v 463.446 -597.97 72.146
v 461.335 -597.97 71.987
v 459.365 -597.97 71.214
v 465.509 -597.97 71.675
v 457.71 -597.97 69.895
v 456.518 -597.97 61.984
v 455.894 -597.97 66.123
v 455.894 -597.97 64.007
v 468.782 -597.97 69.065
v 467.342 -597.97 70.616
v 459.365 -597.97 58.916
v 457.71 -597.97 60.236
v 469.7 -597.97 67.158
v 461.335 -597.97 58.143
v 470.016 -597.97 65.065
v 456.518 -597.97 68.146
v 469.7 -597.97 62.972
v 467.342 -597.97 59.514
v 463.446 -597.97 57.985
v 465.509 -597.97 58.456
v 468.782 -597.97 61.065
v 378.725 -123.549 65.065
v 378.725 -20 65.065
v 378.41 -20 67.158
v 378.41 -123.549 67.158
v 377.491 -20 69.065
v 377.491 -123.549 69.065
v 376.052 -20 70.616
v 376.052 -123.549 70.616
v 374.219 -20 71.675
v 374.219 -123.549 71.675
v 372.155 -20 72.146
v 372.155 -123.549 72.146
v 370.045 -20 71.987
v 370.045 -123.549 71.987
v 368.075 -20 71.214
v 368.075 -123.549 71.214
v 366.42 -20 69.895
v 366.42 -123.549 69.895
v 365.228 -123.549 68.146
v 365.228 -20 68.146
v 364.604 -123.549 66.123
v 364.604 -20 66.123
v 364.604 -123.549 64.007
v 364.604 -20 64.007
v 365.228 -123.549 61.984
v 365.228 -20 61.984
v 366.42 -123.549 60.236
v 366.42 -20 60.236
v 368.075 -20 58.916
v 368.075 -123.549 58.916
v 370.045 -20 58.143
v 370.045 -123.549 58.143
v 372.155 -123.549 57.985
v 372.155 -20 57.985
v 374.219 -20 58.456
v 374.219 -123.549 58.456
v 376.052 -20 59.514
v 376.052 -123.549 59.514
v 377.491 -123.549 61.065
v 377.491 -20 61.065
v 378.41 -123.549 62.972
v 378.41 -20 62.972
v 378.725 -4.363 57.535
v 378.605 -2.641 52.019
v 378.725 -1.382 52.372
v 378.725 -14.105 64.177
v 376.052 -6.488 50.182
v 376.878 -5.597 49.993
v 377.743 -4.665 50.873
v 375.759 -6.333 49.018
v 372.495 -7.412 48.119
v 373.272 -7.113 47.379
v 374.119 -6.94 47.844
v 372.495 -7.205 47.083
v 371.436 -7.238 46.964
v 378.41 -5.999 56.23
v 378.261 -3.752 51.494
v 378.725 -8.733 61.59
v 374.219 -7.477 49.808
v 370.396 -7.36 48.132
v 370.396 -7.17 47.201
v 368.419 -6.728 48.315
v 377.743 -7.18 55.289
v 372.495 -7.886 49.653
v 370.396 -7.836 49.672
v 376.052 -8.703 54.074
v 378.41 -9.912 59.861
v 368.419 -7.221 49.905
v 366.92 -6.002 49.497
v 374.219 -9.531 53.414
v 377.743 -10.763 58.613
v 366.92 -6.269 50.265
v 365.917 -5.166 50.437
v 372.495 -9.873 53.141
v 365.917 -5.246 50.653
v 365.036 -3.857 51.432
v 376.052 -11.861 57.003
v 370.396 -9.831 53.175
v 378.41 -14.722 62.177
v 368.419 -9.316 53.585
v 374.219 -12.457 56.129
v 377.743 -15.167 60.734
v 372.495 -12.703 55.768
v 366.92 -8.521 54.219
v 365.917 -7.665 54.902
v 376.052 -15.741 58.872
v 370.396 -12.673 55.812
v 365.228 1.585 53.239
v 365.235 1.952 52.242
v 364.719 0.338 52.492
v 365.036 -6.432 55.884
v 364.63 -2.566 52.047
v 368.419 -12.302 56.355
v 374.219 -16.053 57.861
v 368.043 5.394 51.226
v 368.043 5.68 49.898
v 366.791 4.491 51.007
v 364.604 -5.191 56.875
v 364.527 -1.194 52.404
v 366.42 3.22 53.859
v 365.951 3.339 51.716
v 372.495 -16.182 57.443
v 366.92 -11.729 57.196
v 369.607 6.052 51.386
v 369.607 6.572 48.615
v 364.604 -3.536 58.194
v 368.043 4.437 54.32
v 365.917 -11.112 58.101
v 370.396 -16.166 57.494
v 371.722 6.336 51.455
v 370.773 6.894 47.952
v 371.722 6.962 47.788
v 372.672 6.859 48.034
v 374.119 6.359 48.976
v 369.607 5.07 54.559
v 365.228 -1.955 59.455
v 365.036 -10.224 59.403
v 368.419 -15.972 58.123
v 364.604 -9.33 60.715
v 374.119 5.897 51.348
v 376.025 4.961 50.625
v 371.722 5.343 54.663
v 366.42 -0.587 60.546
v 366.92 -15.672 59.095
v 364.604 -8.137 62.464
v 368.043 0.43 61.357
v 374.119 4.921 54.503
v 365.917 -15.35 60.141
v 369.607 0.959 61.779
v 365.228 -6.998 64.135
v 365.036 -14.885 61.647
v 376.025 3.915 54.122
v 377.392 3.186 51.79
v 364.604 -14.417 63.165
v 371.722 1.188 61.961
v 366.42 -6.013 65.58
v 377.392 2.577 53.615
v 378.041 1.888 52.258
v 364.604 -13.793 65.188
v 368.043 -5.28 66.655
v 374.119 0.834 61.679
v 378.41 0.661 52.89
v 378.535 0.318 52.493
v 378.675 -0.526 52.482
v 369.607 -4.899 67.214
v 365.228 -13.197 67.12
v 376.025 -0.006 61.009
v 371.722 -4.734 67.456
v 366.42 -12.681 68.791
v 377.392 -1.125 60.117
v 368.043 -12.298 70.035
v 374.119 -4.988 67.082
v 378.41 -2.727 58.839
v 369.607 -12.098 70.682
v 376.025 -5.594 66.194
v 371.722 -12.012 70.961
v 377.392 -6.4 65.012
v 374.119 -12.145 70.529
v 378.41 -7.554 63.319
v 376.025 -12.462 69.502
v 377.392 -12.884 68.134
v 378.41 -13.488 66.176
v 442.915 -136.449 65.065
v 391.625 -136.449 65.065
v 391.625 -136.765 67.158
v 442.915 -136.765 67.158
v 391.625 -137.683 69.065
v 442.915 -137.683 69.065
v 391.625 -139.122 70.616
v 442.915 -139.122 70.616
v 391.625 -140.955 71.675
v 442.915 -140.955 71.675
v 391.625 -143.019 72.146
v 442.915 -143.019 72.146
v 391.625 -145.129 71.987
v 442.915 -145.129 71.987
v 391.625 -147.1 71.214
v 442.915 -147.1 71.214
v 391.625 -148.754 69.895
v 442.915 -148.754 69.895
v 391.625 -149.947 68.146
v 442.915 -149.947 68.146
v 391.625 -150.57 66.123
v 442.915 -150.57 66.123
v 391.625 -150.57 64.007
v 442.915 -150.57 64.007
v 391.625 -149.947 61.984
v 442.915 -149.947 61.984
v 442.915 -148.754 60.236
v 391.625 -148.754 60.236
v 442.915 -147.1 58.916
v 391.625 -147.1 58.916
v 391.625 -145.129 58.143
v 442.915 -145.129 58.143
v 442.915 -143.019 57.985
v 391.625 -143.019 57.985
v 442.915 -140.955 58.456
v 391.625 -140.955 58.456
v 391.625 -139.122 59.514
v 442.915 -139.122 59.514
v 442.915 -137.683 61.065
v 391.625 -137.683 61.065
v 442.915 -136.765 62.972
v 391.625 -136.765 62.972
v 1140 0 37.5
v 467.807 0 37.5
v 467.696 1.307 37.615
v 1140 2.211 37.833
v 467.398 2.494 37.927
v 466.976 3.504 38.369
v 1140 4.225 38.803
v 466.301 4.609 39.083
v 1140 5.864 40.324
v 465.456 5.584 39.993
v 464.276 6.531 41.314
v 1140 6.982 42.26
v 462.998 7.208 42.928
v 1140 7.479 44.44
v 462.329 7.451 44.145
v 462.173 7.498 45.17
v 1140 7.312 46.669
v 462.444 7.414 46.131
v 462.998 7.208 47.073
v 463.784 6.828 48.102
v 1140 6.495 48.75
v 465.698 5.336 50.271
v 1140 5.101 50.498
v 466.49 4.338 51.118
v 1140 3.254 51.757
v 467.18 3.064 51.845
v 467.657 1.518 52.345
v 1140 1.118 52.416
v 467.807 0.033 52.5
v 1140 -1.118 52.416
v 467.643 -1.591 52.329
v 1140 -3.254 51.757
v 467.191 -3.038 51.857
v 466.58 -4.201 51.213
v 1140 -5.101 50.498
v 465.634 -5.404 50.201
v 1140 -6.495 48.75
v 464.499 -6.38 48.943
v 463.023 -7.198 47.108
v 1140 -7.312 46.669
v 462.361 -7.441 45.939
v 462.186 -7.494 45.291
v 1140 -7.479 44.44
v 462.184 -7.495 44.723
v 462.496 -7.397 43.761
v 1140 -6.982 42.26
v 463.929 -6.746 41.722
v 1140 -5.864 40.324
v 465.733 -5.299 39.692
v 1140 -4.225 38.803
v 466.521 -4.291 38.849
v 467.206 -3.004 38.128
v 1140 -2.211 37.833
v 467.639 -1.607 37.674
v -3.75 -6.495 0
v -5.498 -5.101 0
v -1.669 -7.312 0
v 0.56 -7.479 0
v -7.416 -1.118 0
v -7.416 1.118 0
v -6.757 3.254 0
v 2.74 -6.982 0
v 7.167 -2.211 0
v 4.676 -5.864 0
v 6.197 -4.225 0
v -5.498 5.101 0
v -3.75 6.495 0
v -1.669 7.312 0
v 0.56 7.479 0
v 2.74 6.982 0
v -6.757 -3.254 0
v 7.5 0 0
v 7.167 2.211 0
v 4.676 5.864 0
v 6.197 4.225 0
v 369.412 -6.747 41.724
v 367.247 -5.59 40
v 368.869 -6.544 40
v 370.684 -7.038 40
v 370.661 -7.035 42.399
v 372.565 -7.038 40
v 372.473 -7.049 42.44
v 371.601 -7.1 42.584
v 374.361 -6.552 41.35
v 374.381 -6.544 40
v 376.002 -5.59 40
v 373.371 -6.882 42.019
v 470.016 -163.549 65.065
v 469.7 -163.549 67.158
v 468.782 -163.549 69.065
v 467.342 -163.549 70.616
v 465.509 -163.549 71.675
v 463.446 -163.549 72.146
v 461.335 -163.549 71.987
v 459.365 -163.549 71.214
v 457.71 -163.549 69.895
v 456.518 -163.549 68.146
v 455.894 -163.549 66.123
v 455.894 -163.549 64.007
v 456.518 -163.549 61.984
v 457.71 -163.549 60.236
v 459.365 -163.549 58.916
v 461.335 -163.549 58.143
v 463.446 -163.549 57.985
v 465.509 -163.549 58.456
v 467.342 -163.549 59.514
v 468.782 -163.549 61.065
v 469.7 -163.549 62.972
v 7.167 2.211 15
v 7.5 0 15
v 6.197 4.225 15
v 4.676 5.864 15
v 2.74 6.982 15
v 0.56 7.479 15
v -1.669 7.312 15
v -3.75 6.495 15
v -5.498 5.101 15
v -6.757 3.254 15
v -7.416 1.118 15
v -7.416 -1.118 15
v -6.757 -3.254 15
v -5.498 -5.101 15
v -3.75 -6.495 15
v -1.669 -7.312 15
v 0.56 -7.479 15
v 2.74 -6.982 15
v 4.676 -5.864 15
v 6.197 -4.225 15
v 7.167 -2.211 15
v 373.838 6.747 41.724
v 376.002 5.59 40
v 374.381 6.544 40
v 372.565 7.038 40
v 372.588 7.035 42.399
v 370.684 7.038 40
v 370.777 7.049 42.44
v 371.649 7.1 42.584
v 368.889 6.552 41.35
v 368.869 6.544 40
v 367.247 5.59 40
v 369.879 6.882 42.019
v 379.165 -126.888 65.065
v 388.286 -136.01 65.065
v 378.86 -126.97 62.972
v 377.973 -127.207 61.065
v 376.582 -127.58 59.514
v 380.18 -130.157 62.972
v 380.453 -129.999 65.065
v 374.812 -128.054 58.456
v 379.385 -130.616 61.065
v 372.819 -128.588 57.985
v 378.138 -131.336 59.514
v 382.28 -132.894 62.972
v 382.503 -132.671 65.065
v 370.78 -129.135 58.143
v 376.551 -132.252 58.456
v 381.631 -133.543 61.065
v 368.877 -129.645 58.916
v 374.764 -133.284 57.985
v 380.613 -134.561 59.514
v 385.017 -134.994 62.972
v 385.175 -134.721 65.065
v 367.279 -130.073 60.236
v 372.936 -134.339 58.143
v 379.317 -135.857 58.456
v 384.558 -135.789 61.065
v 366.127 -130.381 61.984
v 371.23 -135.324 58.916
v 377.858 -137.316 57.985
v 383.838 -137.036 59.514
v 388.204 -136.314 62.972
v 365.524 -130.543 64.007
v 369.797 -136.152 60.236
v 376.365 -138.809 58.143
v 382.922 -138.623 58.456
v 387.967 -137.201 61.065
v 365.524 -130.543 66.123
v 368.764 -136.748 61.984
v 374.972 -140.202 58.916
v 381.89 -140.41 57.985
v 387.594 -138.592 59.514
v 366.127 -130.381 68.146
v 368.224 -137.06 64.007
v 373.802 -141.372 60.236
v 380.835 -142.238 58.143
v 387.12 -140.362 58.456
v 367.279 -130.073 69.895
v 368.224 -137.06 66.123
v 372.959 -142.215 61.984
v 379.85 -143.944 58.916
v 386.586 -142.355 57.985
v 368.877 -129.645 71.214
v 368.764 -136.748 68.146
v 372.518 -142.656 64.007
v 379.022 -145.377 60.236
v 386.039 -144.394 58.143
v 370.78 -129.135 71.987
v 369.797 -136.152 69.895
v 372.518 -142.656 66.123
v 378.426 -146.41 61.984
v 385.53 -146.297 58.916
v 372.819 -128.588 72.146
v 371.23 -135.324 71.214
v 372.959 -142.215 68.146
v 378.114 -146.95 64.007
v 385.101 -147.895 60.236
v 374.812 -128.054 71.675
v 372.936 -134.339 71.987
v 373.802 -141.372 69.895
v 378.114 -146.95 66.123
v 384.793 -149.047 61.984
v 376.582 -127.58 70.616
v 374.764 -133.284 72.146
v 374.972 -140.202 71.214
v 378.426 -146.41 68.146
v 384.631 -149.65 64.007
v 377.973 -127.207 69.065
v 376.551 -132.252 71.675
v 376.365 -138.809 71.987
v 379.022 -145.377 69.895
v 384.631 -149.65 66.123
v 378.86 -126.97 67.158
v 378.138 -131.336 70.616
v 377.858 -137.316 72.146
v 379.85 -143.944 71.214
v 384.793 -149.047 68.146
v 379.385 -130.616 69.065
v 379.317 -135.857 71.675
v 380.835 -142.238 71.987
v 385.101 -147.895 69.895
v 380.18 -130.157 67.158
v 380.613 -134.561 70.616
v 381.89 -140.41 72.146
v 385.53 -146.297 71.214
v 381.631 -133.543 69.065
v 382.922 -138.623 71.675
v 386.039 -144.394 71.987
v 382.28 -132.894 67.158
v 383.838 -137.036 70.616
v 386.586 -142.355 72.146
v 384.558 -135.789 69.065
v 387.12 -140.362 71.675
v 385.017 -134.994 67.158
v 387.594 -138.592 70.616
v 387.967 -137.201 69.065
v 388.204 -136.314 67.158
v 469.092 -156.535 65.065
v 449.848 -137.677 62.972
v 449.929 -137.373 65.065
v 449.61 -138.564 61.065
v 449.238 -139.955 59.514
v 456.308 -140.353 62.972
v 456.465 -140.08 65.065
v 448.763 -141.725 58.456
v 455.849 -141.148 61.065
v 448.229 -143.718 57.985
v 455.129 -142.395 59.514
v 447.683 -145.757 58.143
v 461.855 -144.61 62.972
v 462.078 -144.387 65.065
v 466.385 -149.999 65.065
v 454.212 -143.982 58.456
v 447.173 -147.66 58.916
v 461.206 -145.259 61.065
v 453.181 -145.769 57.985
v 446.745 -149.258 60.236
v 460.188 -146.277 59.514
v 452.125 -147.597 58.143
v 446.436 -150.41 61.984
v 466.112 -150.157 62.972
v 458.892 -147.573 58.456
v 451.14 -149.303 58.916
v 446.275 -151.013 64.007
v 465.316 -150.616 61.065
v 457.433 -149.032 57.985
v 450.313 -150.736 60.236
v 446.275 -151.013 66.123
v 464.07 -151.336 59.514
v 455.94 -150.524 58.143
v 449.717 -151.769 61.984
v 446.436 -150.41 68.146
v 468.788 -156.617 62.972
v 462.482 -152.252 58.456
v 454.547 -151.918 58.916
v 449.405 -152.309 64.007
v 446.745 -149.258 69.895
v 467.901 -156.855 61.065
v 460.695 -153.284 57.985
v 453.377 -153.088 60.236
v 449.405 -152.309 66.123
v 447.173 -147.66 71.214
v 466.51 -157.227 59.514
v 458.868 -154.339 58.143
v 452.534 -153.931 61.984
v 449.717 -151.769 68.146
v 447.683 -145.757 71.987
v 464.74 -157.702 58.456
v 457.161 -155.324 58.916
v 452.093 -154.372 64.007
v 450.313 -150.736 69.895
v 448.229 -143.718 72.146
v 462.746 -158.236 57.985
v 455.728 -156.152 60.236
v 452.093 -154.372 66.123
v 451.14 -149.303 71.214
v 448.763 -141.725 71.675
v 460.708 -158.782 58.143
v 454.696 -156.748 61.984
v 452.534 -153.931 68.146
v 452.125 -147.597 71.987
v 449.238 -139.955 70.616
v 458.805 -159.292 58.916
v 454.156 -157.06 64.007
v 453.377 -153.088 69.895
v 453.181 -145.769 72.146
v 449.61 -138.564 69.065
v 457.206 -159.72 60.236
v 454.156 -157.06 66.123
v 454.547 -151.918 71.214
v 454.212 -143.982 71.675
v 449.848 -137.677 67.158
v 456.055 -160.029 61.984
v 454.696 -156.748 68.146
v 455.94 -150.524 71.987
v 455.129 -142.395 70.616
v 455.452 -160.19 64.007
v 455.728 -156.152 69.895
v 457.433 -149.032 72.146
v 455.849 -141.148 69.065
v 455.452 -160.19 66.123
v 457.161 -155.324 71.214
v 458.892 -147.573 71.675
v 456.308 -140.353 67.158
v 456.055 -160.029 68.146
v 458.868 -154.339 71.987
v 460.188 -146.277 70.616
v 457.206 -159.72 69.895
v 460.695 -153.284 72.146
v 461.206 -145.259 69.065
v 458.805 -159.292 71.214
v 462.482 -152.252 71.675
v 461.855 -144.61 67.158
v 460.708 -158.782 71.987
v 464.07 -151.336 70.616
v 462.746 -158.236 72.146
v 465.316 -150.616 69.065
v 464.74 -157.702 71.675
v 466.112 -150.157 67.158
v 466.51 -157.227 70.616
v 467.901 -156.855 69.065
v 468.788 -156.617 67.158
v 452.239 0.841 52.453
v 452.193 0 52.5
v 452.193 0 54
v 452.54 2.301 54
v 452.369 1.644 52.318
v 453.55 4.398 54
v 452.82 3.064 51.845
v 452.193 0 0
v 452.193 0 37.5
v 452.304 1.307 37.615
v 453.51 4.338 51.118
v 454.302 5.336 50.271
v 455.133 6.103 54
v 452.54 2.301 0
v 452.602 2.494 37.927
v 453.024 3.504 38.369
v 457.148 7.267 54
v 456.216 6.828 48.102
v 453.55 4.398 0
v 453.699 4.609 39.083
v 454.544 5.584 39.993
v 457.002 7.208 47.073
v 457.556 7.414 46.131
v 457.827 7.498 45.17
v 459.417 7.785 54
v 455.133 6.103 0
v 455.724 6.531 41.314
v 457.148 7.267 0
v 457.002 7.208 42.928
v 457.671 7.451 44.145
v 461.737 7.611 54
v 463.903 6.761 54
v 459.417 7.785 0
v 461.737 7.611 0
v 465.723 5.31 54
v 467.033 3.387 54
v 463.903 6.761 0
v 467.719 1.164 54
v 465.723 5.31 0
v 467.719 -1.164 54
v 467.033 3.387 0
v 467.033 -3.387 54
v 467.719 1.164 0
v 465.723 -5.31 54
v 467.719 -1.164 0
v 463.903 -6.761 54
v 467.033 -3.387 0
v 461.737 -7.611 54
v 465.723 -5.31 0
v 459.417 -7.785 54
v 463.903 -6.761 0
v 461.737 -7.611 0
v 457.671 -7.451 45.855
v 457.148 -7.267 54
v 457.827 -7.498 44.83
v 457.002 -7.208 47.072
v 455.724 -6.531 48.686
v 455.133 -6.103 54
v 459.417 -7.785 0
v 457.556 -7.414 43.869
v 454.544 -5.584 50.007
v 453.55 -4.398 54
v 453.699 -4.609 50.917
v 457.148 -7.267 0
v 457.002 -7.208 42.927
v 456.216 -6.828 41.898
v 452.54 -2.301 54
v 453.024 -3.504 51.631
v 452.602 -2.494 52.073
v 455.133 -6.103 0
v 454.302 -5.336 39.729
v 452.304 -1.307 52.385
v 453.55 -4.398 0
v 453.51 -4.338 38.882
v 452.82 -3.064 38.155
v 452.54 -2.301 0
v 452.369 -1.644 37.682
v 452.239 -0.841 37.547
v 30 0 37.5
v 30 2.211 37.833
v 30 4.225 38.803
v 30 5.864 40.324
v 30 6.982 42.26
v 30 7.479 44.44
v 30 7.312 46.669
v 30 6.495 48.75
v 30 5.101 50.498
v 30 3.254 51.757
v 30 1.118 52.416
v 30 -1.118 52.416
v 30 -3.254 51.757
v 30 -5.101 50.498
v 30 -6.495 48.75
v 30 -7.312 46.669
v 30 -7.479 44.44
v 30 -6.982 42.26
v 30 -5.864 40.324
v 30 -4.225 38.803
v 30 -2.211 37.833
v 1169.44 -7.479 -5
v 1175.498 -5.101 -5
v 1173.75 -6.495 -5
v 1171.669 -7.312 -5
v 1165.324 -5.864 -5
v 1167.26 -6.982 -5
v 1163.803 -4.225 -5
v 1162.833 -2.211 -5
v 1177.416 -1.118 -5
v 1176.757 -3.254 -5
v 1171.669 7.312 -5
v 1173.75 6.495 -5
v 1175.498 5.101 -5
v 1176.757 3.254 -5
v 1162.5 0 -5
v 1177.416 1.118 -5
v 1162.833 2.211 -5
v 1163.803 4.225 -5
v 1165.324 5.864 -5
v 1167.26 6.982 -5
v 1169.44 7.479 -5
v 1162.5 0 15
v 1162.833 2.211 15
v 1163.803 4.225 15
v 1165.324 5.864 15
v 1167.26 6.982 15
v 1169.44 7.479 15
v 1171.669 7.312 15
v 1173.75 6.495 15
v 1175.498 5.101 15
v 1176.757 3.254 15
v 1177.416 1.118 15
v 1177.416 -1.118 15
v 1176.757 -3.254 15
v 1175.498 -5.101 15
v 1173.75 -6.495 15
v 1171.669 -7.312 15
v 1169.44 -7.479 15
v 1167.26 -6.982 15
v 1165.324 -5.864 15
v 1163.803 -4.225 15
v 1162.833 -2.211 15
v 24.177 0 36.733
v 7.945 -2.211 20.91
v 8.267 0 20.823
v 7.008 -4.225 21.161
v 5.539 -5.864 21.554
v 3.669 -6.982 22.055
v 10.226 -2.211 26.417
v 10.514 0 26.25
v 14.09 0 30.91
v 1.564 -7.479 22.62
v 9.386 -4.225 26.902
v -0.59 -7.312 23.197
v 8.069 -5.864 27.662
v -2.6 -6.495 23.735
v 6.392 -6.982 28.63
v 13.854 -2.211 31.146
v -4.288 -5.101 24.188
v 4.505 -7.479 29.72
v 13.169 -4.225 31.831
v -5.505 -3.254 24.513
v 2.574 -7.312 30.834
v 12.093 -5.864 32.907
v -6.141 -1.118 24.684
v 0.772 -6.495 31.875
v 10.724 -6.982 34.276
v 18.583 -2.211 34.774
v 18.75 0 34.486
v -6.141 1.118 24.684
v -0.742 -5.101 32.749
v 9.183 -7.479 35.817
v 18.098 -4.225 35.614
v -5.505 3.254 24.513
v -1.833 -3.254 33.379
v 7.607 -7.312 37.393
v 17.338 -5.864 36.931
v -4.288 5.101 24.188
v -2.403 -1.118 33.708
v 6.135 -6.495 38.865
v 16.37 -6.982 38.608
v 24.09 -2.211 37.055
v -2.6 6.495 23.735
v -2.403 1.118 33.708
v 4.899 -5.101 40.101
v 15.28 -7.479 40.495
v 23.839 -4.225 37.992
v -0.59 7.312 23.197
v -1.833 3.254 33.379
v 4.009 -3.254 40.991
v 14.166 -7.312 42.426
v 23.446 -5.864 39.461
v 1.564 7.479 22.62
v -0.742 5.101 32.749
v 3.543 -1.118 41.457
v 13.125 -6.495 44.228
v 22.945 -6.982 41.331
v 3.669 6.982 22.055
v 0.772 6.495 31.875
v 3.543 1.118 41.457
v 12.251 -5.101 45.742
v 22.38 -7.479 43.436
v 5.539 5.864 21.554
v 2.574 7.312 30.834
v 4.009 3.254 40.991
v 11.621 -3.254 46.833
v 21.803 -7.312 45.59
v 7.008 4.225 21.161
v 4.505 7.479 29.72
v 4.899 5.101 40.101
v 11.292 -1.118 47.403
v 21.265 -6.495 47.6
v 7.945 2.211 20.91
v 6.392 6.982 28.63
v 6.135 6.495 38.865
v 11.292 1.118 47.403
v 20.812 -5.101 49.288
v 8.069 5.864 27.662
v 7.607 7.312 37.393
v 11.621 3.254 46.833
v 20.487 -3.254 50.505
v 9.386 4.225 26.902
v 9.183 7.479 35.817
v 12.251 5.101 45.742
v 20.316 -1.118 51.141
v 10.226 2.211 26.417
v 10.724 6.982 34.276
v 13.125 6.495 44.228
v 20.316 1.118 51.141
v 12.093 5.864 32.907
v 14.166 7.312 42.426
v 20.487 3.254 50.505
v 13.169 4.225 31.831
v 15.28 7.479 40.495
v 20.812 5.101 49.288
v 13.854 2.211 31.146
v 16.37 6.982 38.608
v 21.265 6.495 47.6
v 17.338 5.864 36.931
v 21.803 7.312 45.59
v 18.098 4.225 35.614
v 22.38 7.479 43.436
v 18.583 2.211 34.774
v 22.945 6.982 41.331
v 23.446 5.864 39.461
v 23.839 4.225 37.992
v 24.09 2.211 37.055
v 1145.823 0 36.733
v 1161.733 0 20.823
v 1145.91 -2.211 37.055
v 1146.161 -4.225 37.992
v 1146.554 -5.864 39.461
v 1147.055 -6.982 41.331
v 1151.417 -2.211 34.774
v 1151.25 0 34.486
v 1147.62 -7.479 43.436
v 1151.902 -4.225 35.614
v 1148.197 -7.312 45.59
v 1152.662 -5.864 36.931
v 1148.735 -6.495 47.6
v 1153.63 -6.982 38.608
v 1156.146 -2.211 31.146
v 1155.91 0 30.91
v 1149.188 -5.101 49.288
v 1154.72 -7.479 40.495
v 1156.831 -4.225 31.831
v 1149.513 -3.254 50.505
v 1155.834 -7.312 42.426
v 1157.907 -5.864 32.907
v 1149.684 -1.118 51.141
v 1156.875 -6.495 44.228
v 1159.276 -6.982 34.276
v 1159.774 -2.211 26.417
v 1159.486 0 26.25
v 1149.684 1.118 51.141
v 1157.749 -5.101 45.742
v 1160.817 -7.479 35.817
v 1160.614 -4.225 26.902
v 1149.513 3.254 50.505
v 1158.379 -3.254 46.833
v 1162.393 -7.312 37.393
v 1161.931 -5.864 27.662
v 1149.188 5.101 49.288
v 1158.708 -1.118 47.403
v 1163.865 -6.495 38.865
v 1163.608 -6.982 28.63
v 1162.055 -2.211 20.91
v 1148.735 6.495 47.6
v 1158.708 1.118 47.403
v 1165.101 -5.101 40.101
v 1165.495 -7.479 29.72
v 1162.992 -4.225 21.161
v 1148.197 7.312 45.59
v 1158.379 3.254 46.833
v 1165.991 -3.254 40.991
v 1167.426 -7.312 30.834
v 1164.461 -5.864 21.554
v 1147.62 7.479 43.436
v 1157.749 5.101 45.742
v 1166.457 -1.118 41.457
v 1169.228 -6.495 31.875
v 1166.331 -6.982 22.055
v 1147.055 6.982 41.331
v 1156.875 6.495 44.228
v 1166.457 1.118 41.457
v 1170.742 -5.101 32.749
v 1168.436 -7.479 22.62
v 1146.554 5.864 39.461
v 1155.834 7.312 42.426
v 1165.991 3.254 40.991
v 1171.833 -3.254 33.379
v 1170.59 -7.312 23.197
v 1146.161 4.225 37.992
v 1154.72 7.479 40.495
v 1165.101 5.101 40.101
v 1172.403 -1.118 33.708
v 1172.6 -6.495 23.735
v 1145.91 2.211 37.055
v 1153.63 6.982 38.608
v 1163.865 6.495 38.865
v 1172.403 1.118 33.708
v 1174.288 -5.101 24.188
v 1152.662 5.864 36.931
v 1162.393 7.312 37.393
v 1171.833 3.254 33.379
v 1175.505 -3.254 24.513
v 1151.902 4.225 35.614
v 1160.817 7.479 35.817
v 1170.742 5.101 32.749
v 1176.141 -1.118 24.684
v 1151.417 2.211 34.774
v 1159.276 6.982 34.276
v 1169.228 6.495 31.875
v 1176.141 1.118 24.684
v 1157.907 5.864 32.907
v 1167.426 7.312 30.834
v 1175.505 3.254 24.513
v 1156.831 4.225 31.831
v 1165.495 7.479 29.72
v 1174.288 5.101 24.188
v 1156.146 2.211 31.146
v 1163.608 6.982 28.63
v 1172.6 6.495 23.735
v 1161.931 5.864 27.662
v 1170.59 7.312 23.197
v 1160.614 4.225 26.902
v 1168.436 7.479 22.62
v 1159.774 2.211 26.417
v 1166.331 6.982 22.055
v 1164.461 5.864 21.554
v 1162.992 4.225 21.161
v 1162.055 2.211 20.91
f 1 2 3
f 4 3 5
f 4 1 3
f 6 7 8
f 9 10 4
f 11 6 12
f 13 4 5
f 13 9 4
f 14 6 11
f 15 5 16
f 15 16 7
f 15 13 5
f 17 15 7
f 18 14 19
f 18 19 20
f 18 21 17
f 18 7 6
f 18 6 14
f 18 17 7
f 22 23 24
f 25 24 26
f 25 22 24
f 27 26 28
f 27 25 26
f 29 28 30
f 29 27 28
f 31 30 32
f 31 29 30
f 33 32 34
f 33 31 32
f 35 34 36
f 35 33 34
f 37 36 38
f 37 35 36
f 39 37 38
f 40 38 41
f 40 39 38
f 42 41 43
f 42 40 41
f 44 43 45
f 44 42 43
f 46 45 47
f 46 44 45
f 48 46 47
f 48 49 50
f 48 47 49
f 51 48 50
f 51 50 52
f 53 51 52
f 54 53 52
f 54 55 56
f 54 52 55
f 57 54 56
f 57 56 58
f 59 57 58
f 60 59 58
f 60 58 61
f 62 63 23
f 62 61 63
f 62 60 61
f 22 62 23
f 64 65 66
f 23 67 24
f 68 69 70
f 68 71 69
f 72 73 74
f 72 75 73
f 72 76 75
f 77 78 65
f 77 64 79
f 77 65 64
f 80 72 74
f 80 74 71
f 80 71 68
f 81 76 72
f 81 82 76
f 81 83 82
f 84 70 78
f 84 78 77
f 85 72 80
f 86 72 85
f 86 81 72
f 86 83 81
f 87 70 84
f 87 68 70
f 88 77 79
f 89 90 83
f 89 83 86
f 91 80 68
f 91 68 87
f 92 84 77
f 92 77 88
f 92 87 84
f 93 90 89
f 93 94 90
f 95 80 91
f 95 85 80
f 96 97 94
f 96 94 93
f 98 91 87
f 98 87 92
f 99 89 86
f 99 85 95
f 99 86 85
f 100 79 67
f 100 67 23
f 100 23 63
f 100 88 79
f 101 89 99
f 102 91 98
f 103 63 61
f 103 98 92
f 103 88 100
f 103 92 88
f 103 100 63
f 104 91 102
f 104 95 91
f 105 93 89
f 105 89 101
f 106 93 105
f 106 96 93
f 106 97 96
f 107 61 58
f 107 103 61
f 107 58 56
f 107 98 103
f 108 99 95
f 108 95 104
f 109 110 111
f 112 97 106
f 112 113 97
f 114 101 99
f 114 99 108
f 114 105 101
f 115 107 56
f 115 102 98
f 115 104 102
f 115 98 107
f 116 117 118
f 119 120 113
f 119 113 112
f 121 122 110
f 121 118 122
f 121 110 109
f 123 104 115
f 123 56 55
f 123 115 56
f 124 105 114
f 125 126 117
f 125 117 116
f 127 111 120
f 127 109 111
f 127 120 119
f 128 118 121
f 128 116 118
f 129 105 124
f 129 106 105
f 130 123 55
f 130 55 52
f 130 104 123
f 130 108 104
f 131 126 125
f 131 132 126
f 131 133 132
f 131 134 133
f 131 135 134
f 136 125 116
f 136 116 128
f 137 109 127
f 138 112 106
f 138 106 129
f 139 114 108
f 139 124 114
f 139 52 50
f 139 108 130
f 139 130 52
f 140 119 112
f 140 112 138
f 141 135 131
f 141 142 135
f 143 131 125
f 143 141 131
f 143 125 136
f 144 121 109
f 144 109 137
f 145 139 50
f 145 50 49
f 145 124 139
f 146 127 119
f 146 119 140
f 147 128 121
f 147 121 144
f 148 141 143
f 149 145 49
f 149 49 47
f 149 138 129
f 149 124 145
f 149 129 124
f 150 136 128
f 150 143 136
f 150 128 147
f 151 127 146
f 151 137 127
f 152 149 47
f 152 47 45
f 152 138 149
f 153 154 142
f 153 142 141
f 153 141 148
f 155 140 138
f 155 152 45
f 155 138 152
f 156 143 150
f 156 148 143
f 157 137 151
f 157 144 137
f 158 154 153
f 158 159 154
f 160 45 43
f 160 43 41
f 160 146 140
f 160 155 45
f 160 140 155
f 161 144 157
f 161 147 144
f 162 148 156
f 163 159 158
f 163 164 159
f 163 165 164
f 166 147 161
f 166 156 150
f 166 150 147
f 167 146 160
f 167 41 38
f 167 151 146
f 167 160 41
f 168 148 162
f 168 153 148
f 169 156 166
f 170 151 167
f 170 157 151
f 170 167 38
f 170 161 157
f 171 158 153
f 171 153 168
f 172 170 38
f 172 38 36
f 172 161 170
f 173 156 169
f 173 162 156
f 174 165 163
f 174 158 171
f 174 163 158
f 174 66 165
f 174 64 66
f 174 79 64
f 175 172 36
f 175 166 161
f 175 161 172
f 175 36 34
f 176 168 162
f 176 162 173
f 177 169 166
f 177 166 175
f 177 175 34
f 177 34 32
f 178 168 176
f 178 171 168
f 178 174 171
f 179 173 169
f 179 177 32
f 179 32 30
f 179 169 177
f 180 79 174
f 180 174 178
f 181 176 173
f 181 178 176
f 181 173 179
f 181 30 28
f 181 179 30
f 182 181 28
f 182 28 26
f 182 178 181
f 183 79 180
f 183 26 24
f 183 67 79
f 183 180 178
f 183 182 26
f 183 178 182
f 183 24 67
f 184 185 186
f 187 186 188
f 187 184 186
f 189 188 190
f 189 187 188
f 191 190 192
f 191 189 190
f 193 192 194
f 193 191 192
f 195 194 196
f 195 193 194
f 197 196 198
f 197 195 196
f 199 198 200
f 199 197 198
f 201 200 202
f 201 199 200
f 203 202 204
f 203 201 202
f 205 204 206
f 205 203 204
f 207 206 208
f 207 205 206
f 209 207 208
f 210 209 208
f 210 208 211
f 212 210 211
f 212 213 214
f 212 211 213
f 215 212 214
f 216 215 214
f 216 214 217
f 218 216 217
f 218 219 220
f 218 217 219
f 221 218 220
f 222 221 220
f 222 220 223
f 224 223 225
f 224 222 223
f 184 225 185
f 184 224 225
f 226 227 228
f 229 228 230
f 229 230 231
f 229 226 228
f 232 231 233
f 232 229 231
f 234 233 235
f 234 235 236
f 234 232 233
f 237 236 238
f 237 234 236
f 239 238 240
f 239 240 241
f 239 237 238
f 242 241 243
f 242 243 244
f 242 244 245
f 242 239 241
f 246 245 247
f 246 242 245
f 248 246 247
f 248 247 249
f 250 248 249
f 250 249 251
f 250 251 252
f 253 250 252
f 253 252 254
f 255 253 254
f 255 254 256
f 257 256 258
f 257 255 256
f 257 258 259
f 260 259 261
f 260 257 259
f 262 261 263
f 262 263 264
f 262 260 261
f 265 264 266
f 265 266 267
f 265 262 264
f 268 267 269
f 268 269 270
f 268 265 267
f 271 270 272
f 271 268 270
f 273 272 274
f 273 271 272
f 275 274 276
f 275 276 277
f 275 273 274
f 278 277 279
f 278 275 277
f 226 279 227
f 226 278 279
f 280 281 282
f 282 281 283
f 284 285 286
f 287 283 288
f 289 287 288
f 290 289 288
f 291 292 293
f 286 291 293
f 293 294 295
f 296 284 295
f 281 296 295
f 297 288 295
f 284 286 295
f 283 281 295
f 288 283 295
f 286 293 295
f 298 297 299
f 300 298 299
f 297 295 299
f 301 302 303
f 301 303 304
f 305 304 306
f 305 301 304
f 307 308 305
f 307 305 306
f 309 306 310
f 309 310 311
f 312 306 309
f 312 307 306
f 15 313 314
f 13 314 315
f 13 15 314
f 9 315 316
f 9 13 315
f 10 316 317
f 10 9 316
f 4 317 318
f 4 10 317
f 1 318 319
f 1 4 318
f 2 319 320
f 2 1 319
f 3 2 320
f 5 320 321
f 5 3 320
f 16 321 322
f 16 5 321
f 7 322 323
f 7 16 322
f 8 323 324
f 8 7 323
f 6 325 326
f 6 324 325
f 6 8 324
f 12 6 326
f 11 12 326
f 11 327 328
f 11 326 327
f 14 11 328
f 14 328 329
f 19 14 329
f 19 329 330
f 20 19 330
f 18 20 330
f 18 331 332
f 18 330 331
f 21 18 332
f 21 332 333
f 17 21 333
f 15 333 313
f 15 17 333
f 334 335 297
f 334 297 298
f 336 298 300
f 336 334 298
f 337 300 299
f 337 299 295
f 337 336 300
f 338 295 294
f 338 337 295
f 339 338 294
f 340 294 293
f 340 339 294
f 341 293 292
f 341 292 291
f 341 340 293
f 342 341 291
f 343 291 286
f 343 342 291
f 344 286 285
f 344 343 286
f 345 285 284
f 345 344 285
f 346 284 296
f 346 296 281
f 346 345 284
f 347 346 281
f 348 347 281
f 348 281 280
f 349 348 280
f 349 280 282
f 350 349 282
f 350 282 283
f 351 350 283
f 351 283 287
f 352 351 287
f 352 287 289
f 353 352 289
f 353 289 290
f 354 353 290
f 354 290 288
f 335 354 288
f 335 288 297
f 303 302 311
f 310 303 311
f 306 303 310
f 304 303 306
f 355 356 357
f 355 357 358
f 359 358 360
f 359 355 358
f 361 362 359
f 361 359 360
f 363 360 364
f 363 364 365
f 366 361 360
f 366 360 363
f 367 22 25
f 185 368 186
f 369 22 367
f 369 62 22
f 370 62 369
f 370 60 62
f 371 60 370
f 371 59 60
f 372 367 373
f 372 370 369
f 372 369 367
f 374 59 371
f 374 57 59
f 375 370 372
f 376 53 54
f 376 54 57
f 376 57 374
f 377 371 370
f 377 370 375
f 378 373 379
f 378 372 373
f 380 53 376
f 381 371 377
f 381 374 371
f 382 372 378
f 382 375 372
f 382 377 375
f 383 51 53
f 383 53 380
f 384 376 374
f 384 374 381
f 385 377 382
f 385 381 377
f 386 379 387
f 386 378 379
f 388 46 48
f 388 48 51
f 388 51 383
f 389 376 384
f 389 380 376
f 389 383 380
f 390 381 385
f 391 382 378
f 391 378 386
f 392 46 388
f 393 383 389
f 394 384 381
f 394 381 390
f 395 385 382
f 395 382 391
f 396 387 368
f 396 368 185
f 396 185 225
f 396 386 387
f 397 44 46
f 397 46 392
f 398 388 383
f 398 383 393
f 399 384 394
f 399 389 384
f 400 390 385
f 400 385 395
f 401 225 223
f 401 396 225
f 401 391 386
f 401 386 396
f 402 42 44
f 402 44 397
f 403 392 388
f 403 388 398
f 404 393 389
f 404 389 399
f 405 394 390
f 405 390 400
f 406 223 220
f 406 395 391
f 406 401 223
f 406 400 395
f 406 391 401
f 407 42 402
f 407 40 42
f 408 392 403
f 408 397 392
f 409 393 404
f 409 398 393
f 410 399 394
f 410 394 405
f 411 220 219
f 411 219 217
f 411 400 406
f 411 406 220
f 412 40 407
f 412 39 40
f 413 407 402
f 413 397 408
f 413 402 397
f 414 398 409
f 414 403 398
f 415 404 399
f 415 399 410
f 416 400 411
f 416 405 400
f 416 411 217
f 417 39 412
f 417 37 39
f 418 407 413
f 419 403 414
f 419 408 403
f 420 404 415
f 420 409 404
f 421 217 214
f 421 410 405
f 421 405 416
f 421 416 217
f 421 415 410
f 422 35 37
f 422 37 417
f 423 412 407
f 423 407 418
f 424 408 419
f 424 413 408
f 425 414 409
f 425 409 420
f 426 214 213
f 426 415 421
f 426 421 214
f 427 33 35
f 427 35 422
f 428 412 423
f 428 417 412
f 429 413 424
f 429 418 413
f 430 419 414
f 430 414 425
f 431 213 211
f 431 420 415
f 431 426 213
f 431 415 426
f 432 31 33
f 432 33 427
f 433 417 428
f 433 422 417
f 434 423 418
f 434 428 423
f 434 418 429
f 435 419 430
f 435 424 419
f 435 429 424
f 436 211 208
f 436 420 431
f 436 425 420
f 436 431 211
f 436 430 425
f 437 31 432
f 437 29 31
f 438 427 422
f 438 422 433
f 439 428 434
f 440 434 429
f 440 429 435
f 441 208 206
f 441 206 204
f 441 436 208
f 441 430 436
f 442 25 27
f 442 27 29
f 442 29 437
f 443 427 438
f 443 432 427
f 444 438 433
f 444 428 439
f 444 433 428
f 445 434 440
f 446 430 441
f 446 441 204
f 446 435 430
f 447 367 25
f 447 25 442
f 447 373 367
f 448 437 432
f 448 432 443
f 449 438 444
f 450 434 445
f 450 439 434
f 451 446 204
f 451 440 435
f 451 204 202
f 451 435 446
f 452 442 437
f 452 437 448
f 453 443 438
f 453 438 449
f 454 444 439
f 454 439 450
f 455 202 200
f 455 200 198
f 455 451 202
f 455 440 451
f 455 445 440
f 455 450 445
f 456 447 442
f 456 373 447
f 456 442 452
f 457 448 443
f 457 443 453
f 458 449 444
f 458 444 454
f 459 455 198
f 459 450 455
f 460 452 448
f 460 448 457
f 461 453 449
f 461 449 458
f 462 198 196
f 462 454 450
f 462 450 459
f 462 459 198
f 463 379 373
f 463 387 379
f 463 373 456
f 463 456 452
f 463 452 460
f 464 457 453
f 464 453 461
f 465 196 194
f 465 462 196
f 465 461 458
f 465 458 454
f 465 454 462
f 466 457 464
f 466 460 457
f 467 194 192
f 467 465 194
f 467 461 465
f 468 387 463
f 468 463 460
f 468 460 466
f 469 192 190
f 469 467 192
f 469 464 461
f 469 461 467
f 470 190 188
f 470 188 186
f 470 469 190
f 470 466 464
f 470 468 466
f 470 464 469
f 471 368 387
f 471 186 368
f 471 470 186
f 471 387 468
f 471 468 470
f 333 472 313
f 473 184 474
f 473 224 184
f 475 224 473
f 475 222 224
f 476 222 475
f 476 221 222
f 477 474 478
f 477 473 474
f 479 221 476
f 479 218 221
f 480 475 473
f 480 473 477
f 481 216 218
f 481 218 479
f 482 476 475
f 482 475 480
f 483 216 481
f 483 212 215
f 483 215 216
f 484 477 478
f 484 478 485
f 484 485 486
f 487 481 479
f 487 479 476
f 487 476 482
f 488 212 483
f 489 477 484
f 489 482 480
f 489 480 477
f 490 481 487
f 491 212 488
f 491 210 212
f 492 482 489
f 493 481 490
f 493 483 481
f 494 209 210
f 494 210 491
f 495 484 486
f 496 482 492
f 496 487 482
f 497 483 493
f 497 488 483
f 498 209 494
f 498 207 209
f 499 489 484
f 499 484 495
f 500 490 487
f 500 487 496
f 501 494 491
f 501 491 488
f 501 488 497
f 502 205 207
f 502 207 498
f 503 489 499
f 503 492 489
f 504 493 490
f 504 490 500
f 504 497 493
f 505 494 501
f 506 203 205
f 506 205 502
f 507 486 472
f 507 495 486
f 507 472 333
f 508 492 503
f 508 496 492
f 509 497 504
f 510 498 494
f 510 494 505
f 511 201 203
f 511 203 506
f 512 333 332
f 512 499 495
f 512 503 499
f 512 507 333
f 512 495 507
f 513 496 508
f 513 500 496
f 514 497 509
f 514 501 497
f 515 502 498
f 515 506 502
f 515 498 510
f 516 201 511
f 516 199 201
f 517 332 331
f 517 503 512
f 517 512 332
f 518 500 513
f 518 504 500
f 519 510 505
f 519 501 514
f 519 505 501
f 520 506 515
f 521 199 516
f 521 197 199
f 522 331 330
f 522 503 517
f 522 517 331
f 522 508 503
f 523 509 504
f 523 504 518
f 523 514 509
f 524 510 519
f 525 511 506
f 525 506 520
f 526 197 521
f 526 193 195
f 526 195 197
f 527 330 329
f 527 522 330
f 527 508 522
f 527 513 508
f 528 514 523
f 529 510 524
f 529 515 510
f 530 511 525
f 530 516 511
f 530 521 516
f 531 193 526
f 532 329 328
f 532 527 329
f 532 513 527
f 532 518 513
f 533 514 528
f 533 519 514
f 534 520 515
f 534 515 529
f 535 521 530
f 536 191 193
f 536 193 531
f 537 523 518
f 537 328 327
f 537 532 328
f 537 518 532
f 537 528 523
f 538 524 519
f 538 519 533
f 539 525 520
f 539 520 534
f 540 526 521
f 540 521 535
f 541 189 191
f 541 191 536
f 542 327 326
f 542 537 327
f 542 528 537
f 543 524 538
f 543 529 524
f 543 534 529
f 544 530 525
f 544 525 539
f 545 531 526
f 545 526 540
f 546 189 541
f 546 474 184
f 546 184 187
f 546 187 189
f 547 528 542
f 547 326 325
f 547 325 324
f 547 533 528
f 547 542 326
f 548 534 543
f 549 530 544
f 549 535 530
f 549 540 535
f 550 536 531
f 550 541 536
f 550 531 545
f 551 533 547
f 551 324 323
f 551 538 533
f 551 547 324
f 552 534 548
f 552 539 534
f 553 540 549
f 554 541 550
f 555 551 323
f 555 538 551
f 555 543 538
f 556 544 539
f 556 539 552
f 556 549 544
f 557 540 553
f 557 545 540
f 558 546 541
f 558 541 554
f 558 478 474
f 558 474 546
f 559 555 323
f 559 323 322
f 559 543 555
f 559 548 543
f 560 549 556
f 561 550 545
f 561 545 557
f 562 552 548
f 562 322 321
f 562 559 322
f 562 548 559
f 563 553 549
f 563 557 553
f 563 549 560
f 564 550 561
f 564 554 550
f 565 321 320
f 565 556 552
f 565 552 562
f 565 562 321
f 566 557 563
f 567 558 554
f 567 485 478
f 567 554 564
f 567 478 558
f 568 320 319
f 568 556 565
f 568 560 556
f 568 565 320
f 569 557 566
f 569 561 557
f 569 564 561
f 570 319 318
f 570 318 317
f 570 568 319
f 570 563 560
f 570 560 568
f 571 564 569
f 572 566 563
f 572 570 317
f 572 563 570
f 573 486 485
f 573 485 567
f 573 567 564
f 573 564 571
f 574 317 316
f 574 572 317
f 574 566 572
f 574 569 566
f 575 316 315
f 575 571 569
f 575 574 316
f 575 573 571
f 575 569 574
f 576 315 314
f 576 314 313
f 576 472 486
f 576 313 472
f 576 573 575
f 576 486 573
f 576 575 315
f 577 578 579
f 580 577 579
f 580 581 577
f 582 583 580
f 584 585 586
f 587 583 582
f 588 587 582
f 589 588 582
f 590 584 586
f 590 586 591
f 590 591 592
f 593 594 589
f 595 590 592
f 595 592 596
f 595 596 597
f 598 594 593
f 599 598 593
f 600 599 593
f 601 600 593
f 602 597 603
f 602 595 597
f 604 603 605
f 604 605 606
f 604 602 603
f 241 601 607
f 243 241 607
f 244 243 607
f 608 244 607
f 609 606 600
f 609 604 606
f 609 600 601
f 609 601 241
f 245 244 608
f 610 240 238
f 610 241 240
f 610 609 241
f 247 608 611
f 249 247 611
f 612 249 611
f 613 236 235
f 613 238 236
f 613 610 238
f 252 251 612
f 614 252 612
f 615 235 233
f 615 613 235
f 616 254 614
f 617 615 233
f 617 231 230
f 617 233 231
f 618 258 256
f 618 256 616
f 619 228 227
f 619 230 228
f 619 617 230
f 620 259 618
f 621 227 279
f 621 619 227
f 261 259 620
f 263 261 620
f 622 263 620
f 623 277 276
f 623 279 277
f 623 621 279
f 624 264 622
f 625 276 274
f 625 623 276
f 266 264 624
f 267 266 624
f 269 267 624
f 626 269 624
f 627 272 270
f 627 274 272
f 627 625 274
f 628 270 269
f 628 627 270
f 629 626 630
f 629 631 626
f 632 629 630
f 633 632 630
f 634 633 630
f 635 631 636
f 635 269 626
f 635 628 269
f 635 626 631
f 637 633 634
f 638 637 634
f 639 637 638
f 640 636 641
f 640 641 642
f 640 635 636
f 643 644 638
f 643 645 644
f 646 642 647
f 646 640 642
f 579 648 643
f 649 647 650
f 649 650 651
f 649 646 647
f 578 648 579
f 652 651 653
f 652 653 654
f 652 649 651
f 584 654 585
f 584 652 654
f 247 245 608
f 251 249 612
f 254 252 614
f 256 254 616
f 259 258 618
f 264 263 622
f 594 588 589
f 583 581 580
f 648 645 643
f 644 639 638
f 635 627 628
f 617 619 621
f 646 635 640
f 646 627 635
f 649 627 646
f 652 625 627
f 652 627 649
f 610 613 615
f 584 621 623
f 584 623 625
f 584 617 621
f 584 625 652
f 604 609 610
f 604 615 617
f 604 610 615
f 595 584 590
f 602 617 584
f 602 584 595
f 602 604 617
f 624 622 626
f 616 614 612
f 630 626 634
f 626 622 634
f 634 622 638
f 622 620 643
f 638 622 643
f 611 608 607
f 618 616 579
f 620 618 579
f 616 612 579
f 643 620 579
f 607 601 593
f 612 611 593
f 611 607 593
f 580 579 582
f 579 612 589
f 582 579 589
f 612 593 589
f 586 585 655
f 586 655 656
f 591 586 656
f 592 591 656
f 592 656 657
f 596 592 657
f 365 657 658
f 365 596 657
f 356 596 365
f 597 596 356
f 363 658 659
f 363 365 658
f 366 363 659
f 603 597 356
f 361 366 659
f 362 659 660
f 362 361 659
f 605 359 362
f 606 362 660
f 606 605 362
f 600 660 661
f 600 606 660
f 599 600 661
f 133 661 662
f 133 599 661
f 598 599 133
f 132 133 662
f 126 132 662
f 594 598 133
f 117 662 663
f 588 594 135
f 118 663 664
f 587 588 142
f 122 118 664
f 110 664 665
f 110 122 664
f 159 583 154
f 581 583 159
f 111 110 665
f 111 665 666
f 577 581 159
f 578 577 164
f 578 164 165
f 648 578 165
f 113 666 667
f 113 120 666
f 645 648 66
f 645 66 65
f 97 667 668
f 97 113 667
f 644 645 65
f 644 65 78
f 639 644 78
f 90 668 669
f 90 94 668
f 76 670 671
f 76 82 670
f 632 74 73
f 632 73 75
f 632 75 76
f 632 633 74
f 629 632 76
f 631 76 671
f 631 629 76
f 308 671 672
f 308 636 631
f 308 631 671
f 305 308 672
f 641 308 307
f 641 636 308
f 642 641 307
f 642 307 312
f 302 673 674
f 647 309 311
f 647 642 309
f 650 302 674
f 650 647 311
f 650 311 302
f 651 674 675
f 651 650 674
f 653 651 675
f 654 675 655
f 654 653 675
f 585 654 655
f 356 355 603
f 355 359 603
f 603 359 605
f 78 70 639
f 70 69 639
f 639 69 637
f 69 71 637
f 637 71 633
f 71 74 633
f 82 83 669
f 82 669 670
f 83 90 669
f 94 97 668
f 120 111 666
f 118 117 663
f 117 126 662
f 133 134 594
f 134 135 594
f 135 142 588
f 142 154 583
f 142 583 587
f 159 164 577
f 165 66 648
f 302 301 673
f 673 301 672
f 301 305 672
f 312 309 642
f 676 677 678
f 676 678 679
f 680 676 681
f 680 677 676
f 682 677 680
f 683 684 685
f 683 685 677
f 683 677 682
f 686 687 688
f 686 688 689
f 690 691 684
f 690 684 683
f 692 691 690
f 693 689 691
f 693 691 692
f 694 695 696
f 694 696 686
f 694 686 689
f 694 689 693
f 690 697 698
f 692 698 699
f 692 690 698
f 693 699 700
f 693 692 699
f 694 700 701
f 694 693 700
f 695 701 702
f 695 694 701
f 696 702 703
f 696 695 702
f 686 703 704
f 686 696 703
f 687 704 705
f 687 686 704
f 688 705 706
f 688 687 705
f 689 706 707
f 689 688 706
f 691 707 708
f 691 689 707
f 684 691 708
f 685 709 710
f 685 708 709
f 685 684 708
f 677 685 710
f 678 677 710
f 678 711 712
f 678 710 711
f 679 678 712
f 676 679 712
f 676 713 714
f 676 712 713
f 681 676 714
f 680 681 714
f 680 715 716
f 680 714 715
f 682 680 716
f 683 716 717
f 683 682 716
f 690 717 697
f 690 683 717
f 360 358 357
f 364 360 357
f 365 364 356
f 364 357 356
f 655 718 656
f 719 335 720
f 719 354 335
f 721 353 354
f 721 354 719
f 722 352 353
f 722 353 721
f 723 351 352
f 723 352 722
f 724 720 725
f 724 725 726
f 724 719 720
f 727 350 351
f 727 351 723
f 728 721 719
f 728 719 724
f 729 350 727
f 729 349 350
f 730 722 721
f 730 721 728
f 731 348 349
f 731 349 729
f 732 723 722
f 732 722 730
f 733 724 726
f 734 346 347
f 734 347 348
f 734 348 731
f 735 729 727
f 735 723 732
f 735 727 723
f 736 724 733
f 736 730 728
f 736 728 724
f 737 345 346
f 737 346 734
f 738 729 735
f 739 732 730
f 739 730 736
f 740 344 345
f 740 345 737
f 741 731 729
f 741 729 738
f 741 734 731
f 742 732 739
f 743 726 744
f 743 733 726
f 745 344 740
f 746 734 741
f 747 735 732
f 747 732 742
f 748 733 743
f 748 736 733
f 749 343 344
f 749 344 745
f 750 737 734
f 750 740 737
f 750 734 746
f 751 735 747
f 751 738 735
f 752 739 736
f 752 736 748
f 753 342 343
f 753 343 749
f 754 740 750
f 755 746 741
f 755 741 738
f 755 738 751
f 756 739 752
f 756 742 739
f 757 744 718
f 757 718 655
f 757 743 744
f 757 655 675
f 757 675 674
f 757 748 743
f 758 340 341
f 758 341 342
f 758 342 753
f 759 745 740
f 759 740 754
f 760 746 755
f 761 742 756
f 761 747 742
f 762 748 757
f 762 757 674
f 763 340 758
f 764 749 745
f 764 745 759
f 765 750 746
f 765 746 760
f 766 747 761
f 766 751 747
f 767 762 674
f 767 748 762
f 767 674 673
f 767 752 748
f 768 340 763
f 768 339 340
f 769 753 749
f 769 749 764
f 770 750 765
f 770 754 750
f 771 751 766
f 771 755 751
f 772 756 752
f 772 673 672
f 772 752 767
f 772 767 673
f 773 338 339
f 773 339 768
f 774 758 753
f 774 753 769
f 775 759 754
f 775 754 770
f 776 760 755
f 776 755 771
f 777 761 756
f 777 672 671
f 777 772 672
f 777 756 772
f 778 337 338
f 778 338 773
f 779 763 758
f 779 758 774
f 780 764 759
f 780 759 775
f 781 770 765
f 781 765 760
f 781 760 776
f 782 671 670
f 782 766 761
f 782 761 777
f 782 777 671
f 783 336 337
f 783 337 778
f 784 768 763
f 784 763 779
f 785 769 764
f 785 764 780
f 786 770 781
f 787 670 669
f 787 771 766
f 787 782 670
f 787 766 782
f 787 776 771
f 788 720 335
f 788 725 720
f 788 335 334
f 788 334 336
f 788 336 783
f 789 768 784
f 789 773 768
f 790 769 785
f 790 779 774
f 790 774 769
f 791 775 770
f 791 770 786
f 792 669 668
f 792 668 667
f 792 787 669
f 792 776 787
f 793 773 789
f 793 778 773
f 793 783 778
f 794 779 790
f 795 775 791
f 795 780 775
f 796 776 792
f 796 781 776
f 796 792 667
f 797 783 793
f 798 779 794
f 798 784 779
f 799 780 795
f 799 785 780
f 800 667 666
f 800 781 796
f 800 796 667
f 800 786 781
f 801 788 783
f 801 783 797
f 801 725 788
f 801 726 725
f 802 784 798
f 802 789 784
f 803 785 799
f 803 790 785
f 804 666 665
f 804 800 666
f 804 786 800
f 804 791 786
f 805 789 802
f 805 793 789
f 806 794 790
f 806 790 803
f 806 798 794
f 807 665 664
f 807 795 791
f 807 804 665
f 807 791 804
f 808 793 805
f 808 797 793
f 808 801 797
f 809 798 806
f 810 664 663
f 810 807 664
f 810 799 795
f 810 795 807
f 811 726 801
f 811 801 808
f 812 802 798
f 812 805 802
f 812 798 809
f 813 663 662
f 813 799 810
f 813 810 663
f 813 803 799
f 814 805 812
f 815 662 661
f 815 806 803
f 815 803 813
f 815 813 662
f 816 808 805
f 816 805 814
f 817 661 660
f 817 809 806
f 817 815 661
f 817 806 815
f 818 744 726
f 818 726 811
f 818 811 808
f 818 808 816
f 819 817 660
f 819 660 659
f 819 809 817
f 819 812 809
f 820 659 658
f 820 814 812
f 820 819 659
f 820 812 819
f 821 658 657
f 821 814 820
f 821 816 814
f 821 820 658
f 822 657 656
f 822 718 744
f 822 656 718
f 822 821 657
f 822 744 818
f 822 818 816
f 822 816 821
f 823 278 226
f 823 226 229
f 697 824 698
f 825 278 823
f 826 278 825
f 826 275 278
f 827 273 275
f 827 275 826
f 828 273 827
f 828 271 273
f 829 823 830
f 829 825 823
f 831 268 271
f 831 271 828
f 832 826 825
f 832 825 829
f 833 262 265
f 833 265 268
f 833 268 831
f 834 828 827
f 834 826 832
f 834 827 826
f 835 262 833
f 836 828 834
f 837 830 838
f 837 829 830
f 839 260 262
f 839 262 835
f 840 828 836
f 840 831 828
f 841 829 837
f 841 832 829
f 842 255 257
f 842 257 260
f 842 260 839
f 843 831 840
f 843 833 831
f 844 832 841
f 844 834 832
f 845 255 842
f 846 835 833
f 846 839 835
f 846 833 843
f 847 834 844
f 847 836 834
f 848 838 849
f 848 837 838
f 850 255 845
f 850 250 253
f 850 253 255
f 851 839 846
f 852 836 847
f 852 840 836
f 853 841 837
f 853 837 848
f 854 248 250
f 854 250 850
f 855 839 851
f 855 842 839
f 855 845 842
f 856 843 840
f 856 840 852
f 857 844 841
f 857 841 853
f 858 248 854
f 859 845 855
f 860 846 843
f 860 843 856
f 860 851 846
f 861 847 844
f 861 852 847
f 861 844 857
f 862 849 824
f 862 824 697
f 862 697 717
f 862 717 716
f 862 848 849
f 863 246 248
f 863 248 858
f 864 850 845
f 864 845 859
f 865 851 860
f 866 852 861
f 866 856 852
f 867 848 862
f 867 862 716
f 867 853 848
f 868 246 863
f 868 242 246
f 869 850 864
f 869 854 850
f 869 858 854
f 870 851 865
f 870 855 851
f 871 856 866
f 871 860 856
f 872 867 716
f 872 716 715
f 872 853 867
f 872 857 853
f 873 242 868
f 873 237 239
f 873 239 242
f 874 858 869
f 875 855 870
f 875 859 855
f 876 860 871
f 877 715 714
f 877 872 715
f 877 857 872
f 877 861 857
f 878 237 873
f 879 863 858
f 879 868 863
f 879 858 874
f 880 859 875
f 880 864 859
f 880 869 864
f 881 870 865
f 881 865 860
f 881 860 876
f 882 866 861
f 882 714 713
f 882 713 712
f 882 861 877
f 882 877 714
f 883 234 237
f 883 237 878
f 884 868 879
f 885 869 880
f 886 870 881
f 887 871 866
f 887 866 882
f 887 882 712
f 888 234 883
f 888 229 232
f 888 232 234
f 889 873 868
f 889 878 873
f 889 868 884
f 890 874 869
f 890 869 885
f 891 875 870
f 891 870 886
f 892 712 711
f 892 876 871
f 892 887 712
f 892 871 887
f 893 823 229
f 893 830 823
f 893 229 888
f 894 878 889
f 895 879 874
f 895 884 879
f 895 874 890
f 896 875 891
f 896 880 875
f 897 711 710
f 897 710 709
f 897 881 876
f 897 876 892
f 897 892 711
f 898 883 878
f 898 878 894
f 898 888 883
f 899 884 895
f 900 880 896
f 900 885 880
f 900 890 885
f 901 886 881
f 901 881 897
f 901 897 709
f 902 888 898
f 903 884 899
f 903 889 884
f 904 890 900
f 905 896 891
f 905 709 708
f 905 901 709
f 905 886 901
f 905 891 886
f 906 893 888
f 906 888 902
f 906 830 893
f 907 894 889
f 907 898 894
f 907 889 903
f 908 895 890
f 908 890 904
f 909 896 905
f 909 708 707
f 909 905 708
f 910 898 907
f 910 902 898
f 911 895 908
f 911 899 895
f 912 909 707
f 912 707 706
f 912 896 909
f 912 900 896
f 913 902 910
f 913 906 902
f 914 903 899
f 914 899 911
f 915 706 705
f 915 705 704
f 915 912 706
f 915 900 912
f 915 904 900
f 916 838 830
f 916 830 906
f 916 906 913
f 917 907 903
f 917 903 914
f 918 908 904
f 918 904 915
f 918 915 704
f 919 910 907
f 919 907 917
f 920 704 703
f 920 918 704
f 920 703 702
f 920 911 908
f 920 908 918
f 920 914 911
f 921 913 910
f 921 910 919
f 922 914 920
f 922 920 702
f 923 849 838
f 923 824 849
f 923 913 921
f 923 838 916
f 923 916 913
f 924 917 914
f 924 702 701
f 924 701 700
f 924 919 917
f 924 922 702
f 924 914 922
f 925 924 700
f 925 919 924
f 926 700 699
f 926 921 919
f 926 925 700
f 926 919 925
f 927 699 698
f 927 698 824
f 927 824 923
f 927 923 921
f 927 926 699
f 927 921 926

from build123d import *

# Parameters (mm, degrees)
BARRER1_PROFILE_R       = 7.5
CROQUIS22_R             = 7.806571202
SALIENTE_EXTRUIR1_DEPTH = 54
CROQUIS27_R             = 7.100276195


with BuildPart() as part:
    # Barrer1: sweep along a curve in space
    with BuildLine() as barrer1_path:
        Line((0, 0, 0), (0, 0, 15))
        ThreePointArc((0, 0, 15), (8.786796564, 0, 36.213203436), (30, 0, 45))
        Line((30, 0, 45), (1140, 0, 45))
        ThreePointArc((1140, 0, 45), (1161.213203436, 0, 36.213203436), (1170, 0, 15))
        Line((1170, 0, 15), (1170, 0, -5))
    # Barrer1 profile (on start of the path) → Barrer1 (sweep)
    with BuildSketch(Plane.XY):
        Circle(BARRER1_PROFILE_R)
    sweep(path=barrer1_path.line)

    # Croquis22 → Saliente-Extruir1 (add)
    with BuildSketch(Plane(origin=(0, 0, 0), x_dir=(-1, 0, 0), z_dir=(0, 0, -1))):
        with Locations((-460, 0)):
            Circle(CROQUIS22_R)
    extrude(amount=-SALIENTE_EXTRUIR1_DEPTH)

    # Barrer3: sweep along a curve in space
    with BuildLine() as barrer3_path:
        Line((371.624742297, 0, 40), (371.624742297, 0, 45.065102587))
        ThreePointArc((371.624742297, 0, 45.065102587), (371.624742297, -5.857864376, 59.207238211), (371.624742297, -20, 65.065102587))
        Line((371.624742297, -20, 65.065102587), (371.624742297, -123.549378699, 65.065102587))
        ThreePointArc((371.624742297, -123.549378699, 65.065102587), (377.482606674, -137.691514323, 65.065102587), (391.624742297, -143.549378699, 65.065102587))
        Line((391.624742297, -143.549378699, 65.065102587), (442.915360808, -143.549378699, 65.065102587))
        ThreePointArc((442.915360808, -143.549378699, 65.065102587), (457.057496431, -149.407243075, 65.065102587), (462.915360808, -163.549378699, 65.065102587))
        Line((462.915360808, -163.549378699, 65.065102587), (462.915360808, -597.969998302, 65.065102587))
    # Croquis27 → Barrer3 (sweep)
    with BuildSketch(Plane.XY.offset(40)):
        with Locations((371.624742297, 0)):
            Circle(CROQUIS27_R)
    sweep(path=barrer3_path.line)


solid = part.part
